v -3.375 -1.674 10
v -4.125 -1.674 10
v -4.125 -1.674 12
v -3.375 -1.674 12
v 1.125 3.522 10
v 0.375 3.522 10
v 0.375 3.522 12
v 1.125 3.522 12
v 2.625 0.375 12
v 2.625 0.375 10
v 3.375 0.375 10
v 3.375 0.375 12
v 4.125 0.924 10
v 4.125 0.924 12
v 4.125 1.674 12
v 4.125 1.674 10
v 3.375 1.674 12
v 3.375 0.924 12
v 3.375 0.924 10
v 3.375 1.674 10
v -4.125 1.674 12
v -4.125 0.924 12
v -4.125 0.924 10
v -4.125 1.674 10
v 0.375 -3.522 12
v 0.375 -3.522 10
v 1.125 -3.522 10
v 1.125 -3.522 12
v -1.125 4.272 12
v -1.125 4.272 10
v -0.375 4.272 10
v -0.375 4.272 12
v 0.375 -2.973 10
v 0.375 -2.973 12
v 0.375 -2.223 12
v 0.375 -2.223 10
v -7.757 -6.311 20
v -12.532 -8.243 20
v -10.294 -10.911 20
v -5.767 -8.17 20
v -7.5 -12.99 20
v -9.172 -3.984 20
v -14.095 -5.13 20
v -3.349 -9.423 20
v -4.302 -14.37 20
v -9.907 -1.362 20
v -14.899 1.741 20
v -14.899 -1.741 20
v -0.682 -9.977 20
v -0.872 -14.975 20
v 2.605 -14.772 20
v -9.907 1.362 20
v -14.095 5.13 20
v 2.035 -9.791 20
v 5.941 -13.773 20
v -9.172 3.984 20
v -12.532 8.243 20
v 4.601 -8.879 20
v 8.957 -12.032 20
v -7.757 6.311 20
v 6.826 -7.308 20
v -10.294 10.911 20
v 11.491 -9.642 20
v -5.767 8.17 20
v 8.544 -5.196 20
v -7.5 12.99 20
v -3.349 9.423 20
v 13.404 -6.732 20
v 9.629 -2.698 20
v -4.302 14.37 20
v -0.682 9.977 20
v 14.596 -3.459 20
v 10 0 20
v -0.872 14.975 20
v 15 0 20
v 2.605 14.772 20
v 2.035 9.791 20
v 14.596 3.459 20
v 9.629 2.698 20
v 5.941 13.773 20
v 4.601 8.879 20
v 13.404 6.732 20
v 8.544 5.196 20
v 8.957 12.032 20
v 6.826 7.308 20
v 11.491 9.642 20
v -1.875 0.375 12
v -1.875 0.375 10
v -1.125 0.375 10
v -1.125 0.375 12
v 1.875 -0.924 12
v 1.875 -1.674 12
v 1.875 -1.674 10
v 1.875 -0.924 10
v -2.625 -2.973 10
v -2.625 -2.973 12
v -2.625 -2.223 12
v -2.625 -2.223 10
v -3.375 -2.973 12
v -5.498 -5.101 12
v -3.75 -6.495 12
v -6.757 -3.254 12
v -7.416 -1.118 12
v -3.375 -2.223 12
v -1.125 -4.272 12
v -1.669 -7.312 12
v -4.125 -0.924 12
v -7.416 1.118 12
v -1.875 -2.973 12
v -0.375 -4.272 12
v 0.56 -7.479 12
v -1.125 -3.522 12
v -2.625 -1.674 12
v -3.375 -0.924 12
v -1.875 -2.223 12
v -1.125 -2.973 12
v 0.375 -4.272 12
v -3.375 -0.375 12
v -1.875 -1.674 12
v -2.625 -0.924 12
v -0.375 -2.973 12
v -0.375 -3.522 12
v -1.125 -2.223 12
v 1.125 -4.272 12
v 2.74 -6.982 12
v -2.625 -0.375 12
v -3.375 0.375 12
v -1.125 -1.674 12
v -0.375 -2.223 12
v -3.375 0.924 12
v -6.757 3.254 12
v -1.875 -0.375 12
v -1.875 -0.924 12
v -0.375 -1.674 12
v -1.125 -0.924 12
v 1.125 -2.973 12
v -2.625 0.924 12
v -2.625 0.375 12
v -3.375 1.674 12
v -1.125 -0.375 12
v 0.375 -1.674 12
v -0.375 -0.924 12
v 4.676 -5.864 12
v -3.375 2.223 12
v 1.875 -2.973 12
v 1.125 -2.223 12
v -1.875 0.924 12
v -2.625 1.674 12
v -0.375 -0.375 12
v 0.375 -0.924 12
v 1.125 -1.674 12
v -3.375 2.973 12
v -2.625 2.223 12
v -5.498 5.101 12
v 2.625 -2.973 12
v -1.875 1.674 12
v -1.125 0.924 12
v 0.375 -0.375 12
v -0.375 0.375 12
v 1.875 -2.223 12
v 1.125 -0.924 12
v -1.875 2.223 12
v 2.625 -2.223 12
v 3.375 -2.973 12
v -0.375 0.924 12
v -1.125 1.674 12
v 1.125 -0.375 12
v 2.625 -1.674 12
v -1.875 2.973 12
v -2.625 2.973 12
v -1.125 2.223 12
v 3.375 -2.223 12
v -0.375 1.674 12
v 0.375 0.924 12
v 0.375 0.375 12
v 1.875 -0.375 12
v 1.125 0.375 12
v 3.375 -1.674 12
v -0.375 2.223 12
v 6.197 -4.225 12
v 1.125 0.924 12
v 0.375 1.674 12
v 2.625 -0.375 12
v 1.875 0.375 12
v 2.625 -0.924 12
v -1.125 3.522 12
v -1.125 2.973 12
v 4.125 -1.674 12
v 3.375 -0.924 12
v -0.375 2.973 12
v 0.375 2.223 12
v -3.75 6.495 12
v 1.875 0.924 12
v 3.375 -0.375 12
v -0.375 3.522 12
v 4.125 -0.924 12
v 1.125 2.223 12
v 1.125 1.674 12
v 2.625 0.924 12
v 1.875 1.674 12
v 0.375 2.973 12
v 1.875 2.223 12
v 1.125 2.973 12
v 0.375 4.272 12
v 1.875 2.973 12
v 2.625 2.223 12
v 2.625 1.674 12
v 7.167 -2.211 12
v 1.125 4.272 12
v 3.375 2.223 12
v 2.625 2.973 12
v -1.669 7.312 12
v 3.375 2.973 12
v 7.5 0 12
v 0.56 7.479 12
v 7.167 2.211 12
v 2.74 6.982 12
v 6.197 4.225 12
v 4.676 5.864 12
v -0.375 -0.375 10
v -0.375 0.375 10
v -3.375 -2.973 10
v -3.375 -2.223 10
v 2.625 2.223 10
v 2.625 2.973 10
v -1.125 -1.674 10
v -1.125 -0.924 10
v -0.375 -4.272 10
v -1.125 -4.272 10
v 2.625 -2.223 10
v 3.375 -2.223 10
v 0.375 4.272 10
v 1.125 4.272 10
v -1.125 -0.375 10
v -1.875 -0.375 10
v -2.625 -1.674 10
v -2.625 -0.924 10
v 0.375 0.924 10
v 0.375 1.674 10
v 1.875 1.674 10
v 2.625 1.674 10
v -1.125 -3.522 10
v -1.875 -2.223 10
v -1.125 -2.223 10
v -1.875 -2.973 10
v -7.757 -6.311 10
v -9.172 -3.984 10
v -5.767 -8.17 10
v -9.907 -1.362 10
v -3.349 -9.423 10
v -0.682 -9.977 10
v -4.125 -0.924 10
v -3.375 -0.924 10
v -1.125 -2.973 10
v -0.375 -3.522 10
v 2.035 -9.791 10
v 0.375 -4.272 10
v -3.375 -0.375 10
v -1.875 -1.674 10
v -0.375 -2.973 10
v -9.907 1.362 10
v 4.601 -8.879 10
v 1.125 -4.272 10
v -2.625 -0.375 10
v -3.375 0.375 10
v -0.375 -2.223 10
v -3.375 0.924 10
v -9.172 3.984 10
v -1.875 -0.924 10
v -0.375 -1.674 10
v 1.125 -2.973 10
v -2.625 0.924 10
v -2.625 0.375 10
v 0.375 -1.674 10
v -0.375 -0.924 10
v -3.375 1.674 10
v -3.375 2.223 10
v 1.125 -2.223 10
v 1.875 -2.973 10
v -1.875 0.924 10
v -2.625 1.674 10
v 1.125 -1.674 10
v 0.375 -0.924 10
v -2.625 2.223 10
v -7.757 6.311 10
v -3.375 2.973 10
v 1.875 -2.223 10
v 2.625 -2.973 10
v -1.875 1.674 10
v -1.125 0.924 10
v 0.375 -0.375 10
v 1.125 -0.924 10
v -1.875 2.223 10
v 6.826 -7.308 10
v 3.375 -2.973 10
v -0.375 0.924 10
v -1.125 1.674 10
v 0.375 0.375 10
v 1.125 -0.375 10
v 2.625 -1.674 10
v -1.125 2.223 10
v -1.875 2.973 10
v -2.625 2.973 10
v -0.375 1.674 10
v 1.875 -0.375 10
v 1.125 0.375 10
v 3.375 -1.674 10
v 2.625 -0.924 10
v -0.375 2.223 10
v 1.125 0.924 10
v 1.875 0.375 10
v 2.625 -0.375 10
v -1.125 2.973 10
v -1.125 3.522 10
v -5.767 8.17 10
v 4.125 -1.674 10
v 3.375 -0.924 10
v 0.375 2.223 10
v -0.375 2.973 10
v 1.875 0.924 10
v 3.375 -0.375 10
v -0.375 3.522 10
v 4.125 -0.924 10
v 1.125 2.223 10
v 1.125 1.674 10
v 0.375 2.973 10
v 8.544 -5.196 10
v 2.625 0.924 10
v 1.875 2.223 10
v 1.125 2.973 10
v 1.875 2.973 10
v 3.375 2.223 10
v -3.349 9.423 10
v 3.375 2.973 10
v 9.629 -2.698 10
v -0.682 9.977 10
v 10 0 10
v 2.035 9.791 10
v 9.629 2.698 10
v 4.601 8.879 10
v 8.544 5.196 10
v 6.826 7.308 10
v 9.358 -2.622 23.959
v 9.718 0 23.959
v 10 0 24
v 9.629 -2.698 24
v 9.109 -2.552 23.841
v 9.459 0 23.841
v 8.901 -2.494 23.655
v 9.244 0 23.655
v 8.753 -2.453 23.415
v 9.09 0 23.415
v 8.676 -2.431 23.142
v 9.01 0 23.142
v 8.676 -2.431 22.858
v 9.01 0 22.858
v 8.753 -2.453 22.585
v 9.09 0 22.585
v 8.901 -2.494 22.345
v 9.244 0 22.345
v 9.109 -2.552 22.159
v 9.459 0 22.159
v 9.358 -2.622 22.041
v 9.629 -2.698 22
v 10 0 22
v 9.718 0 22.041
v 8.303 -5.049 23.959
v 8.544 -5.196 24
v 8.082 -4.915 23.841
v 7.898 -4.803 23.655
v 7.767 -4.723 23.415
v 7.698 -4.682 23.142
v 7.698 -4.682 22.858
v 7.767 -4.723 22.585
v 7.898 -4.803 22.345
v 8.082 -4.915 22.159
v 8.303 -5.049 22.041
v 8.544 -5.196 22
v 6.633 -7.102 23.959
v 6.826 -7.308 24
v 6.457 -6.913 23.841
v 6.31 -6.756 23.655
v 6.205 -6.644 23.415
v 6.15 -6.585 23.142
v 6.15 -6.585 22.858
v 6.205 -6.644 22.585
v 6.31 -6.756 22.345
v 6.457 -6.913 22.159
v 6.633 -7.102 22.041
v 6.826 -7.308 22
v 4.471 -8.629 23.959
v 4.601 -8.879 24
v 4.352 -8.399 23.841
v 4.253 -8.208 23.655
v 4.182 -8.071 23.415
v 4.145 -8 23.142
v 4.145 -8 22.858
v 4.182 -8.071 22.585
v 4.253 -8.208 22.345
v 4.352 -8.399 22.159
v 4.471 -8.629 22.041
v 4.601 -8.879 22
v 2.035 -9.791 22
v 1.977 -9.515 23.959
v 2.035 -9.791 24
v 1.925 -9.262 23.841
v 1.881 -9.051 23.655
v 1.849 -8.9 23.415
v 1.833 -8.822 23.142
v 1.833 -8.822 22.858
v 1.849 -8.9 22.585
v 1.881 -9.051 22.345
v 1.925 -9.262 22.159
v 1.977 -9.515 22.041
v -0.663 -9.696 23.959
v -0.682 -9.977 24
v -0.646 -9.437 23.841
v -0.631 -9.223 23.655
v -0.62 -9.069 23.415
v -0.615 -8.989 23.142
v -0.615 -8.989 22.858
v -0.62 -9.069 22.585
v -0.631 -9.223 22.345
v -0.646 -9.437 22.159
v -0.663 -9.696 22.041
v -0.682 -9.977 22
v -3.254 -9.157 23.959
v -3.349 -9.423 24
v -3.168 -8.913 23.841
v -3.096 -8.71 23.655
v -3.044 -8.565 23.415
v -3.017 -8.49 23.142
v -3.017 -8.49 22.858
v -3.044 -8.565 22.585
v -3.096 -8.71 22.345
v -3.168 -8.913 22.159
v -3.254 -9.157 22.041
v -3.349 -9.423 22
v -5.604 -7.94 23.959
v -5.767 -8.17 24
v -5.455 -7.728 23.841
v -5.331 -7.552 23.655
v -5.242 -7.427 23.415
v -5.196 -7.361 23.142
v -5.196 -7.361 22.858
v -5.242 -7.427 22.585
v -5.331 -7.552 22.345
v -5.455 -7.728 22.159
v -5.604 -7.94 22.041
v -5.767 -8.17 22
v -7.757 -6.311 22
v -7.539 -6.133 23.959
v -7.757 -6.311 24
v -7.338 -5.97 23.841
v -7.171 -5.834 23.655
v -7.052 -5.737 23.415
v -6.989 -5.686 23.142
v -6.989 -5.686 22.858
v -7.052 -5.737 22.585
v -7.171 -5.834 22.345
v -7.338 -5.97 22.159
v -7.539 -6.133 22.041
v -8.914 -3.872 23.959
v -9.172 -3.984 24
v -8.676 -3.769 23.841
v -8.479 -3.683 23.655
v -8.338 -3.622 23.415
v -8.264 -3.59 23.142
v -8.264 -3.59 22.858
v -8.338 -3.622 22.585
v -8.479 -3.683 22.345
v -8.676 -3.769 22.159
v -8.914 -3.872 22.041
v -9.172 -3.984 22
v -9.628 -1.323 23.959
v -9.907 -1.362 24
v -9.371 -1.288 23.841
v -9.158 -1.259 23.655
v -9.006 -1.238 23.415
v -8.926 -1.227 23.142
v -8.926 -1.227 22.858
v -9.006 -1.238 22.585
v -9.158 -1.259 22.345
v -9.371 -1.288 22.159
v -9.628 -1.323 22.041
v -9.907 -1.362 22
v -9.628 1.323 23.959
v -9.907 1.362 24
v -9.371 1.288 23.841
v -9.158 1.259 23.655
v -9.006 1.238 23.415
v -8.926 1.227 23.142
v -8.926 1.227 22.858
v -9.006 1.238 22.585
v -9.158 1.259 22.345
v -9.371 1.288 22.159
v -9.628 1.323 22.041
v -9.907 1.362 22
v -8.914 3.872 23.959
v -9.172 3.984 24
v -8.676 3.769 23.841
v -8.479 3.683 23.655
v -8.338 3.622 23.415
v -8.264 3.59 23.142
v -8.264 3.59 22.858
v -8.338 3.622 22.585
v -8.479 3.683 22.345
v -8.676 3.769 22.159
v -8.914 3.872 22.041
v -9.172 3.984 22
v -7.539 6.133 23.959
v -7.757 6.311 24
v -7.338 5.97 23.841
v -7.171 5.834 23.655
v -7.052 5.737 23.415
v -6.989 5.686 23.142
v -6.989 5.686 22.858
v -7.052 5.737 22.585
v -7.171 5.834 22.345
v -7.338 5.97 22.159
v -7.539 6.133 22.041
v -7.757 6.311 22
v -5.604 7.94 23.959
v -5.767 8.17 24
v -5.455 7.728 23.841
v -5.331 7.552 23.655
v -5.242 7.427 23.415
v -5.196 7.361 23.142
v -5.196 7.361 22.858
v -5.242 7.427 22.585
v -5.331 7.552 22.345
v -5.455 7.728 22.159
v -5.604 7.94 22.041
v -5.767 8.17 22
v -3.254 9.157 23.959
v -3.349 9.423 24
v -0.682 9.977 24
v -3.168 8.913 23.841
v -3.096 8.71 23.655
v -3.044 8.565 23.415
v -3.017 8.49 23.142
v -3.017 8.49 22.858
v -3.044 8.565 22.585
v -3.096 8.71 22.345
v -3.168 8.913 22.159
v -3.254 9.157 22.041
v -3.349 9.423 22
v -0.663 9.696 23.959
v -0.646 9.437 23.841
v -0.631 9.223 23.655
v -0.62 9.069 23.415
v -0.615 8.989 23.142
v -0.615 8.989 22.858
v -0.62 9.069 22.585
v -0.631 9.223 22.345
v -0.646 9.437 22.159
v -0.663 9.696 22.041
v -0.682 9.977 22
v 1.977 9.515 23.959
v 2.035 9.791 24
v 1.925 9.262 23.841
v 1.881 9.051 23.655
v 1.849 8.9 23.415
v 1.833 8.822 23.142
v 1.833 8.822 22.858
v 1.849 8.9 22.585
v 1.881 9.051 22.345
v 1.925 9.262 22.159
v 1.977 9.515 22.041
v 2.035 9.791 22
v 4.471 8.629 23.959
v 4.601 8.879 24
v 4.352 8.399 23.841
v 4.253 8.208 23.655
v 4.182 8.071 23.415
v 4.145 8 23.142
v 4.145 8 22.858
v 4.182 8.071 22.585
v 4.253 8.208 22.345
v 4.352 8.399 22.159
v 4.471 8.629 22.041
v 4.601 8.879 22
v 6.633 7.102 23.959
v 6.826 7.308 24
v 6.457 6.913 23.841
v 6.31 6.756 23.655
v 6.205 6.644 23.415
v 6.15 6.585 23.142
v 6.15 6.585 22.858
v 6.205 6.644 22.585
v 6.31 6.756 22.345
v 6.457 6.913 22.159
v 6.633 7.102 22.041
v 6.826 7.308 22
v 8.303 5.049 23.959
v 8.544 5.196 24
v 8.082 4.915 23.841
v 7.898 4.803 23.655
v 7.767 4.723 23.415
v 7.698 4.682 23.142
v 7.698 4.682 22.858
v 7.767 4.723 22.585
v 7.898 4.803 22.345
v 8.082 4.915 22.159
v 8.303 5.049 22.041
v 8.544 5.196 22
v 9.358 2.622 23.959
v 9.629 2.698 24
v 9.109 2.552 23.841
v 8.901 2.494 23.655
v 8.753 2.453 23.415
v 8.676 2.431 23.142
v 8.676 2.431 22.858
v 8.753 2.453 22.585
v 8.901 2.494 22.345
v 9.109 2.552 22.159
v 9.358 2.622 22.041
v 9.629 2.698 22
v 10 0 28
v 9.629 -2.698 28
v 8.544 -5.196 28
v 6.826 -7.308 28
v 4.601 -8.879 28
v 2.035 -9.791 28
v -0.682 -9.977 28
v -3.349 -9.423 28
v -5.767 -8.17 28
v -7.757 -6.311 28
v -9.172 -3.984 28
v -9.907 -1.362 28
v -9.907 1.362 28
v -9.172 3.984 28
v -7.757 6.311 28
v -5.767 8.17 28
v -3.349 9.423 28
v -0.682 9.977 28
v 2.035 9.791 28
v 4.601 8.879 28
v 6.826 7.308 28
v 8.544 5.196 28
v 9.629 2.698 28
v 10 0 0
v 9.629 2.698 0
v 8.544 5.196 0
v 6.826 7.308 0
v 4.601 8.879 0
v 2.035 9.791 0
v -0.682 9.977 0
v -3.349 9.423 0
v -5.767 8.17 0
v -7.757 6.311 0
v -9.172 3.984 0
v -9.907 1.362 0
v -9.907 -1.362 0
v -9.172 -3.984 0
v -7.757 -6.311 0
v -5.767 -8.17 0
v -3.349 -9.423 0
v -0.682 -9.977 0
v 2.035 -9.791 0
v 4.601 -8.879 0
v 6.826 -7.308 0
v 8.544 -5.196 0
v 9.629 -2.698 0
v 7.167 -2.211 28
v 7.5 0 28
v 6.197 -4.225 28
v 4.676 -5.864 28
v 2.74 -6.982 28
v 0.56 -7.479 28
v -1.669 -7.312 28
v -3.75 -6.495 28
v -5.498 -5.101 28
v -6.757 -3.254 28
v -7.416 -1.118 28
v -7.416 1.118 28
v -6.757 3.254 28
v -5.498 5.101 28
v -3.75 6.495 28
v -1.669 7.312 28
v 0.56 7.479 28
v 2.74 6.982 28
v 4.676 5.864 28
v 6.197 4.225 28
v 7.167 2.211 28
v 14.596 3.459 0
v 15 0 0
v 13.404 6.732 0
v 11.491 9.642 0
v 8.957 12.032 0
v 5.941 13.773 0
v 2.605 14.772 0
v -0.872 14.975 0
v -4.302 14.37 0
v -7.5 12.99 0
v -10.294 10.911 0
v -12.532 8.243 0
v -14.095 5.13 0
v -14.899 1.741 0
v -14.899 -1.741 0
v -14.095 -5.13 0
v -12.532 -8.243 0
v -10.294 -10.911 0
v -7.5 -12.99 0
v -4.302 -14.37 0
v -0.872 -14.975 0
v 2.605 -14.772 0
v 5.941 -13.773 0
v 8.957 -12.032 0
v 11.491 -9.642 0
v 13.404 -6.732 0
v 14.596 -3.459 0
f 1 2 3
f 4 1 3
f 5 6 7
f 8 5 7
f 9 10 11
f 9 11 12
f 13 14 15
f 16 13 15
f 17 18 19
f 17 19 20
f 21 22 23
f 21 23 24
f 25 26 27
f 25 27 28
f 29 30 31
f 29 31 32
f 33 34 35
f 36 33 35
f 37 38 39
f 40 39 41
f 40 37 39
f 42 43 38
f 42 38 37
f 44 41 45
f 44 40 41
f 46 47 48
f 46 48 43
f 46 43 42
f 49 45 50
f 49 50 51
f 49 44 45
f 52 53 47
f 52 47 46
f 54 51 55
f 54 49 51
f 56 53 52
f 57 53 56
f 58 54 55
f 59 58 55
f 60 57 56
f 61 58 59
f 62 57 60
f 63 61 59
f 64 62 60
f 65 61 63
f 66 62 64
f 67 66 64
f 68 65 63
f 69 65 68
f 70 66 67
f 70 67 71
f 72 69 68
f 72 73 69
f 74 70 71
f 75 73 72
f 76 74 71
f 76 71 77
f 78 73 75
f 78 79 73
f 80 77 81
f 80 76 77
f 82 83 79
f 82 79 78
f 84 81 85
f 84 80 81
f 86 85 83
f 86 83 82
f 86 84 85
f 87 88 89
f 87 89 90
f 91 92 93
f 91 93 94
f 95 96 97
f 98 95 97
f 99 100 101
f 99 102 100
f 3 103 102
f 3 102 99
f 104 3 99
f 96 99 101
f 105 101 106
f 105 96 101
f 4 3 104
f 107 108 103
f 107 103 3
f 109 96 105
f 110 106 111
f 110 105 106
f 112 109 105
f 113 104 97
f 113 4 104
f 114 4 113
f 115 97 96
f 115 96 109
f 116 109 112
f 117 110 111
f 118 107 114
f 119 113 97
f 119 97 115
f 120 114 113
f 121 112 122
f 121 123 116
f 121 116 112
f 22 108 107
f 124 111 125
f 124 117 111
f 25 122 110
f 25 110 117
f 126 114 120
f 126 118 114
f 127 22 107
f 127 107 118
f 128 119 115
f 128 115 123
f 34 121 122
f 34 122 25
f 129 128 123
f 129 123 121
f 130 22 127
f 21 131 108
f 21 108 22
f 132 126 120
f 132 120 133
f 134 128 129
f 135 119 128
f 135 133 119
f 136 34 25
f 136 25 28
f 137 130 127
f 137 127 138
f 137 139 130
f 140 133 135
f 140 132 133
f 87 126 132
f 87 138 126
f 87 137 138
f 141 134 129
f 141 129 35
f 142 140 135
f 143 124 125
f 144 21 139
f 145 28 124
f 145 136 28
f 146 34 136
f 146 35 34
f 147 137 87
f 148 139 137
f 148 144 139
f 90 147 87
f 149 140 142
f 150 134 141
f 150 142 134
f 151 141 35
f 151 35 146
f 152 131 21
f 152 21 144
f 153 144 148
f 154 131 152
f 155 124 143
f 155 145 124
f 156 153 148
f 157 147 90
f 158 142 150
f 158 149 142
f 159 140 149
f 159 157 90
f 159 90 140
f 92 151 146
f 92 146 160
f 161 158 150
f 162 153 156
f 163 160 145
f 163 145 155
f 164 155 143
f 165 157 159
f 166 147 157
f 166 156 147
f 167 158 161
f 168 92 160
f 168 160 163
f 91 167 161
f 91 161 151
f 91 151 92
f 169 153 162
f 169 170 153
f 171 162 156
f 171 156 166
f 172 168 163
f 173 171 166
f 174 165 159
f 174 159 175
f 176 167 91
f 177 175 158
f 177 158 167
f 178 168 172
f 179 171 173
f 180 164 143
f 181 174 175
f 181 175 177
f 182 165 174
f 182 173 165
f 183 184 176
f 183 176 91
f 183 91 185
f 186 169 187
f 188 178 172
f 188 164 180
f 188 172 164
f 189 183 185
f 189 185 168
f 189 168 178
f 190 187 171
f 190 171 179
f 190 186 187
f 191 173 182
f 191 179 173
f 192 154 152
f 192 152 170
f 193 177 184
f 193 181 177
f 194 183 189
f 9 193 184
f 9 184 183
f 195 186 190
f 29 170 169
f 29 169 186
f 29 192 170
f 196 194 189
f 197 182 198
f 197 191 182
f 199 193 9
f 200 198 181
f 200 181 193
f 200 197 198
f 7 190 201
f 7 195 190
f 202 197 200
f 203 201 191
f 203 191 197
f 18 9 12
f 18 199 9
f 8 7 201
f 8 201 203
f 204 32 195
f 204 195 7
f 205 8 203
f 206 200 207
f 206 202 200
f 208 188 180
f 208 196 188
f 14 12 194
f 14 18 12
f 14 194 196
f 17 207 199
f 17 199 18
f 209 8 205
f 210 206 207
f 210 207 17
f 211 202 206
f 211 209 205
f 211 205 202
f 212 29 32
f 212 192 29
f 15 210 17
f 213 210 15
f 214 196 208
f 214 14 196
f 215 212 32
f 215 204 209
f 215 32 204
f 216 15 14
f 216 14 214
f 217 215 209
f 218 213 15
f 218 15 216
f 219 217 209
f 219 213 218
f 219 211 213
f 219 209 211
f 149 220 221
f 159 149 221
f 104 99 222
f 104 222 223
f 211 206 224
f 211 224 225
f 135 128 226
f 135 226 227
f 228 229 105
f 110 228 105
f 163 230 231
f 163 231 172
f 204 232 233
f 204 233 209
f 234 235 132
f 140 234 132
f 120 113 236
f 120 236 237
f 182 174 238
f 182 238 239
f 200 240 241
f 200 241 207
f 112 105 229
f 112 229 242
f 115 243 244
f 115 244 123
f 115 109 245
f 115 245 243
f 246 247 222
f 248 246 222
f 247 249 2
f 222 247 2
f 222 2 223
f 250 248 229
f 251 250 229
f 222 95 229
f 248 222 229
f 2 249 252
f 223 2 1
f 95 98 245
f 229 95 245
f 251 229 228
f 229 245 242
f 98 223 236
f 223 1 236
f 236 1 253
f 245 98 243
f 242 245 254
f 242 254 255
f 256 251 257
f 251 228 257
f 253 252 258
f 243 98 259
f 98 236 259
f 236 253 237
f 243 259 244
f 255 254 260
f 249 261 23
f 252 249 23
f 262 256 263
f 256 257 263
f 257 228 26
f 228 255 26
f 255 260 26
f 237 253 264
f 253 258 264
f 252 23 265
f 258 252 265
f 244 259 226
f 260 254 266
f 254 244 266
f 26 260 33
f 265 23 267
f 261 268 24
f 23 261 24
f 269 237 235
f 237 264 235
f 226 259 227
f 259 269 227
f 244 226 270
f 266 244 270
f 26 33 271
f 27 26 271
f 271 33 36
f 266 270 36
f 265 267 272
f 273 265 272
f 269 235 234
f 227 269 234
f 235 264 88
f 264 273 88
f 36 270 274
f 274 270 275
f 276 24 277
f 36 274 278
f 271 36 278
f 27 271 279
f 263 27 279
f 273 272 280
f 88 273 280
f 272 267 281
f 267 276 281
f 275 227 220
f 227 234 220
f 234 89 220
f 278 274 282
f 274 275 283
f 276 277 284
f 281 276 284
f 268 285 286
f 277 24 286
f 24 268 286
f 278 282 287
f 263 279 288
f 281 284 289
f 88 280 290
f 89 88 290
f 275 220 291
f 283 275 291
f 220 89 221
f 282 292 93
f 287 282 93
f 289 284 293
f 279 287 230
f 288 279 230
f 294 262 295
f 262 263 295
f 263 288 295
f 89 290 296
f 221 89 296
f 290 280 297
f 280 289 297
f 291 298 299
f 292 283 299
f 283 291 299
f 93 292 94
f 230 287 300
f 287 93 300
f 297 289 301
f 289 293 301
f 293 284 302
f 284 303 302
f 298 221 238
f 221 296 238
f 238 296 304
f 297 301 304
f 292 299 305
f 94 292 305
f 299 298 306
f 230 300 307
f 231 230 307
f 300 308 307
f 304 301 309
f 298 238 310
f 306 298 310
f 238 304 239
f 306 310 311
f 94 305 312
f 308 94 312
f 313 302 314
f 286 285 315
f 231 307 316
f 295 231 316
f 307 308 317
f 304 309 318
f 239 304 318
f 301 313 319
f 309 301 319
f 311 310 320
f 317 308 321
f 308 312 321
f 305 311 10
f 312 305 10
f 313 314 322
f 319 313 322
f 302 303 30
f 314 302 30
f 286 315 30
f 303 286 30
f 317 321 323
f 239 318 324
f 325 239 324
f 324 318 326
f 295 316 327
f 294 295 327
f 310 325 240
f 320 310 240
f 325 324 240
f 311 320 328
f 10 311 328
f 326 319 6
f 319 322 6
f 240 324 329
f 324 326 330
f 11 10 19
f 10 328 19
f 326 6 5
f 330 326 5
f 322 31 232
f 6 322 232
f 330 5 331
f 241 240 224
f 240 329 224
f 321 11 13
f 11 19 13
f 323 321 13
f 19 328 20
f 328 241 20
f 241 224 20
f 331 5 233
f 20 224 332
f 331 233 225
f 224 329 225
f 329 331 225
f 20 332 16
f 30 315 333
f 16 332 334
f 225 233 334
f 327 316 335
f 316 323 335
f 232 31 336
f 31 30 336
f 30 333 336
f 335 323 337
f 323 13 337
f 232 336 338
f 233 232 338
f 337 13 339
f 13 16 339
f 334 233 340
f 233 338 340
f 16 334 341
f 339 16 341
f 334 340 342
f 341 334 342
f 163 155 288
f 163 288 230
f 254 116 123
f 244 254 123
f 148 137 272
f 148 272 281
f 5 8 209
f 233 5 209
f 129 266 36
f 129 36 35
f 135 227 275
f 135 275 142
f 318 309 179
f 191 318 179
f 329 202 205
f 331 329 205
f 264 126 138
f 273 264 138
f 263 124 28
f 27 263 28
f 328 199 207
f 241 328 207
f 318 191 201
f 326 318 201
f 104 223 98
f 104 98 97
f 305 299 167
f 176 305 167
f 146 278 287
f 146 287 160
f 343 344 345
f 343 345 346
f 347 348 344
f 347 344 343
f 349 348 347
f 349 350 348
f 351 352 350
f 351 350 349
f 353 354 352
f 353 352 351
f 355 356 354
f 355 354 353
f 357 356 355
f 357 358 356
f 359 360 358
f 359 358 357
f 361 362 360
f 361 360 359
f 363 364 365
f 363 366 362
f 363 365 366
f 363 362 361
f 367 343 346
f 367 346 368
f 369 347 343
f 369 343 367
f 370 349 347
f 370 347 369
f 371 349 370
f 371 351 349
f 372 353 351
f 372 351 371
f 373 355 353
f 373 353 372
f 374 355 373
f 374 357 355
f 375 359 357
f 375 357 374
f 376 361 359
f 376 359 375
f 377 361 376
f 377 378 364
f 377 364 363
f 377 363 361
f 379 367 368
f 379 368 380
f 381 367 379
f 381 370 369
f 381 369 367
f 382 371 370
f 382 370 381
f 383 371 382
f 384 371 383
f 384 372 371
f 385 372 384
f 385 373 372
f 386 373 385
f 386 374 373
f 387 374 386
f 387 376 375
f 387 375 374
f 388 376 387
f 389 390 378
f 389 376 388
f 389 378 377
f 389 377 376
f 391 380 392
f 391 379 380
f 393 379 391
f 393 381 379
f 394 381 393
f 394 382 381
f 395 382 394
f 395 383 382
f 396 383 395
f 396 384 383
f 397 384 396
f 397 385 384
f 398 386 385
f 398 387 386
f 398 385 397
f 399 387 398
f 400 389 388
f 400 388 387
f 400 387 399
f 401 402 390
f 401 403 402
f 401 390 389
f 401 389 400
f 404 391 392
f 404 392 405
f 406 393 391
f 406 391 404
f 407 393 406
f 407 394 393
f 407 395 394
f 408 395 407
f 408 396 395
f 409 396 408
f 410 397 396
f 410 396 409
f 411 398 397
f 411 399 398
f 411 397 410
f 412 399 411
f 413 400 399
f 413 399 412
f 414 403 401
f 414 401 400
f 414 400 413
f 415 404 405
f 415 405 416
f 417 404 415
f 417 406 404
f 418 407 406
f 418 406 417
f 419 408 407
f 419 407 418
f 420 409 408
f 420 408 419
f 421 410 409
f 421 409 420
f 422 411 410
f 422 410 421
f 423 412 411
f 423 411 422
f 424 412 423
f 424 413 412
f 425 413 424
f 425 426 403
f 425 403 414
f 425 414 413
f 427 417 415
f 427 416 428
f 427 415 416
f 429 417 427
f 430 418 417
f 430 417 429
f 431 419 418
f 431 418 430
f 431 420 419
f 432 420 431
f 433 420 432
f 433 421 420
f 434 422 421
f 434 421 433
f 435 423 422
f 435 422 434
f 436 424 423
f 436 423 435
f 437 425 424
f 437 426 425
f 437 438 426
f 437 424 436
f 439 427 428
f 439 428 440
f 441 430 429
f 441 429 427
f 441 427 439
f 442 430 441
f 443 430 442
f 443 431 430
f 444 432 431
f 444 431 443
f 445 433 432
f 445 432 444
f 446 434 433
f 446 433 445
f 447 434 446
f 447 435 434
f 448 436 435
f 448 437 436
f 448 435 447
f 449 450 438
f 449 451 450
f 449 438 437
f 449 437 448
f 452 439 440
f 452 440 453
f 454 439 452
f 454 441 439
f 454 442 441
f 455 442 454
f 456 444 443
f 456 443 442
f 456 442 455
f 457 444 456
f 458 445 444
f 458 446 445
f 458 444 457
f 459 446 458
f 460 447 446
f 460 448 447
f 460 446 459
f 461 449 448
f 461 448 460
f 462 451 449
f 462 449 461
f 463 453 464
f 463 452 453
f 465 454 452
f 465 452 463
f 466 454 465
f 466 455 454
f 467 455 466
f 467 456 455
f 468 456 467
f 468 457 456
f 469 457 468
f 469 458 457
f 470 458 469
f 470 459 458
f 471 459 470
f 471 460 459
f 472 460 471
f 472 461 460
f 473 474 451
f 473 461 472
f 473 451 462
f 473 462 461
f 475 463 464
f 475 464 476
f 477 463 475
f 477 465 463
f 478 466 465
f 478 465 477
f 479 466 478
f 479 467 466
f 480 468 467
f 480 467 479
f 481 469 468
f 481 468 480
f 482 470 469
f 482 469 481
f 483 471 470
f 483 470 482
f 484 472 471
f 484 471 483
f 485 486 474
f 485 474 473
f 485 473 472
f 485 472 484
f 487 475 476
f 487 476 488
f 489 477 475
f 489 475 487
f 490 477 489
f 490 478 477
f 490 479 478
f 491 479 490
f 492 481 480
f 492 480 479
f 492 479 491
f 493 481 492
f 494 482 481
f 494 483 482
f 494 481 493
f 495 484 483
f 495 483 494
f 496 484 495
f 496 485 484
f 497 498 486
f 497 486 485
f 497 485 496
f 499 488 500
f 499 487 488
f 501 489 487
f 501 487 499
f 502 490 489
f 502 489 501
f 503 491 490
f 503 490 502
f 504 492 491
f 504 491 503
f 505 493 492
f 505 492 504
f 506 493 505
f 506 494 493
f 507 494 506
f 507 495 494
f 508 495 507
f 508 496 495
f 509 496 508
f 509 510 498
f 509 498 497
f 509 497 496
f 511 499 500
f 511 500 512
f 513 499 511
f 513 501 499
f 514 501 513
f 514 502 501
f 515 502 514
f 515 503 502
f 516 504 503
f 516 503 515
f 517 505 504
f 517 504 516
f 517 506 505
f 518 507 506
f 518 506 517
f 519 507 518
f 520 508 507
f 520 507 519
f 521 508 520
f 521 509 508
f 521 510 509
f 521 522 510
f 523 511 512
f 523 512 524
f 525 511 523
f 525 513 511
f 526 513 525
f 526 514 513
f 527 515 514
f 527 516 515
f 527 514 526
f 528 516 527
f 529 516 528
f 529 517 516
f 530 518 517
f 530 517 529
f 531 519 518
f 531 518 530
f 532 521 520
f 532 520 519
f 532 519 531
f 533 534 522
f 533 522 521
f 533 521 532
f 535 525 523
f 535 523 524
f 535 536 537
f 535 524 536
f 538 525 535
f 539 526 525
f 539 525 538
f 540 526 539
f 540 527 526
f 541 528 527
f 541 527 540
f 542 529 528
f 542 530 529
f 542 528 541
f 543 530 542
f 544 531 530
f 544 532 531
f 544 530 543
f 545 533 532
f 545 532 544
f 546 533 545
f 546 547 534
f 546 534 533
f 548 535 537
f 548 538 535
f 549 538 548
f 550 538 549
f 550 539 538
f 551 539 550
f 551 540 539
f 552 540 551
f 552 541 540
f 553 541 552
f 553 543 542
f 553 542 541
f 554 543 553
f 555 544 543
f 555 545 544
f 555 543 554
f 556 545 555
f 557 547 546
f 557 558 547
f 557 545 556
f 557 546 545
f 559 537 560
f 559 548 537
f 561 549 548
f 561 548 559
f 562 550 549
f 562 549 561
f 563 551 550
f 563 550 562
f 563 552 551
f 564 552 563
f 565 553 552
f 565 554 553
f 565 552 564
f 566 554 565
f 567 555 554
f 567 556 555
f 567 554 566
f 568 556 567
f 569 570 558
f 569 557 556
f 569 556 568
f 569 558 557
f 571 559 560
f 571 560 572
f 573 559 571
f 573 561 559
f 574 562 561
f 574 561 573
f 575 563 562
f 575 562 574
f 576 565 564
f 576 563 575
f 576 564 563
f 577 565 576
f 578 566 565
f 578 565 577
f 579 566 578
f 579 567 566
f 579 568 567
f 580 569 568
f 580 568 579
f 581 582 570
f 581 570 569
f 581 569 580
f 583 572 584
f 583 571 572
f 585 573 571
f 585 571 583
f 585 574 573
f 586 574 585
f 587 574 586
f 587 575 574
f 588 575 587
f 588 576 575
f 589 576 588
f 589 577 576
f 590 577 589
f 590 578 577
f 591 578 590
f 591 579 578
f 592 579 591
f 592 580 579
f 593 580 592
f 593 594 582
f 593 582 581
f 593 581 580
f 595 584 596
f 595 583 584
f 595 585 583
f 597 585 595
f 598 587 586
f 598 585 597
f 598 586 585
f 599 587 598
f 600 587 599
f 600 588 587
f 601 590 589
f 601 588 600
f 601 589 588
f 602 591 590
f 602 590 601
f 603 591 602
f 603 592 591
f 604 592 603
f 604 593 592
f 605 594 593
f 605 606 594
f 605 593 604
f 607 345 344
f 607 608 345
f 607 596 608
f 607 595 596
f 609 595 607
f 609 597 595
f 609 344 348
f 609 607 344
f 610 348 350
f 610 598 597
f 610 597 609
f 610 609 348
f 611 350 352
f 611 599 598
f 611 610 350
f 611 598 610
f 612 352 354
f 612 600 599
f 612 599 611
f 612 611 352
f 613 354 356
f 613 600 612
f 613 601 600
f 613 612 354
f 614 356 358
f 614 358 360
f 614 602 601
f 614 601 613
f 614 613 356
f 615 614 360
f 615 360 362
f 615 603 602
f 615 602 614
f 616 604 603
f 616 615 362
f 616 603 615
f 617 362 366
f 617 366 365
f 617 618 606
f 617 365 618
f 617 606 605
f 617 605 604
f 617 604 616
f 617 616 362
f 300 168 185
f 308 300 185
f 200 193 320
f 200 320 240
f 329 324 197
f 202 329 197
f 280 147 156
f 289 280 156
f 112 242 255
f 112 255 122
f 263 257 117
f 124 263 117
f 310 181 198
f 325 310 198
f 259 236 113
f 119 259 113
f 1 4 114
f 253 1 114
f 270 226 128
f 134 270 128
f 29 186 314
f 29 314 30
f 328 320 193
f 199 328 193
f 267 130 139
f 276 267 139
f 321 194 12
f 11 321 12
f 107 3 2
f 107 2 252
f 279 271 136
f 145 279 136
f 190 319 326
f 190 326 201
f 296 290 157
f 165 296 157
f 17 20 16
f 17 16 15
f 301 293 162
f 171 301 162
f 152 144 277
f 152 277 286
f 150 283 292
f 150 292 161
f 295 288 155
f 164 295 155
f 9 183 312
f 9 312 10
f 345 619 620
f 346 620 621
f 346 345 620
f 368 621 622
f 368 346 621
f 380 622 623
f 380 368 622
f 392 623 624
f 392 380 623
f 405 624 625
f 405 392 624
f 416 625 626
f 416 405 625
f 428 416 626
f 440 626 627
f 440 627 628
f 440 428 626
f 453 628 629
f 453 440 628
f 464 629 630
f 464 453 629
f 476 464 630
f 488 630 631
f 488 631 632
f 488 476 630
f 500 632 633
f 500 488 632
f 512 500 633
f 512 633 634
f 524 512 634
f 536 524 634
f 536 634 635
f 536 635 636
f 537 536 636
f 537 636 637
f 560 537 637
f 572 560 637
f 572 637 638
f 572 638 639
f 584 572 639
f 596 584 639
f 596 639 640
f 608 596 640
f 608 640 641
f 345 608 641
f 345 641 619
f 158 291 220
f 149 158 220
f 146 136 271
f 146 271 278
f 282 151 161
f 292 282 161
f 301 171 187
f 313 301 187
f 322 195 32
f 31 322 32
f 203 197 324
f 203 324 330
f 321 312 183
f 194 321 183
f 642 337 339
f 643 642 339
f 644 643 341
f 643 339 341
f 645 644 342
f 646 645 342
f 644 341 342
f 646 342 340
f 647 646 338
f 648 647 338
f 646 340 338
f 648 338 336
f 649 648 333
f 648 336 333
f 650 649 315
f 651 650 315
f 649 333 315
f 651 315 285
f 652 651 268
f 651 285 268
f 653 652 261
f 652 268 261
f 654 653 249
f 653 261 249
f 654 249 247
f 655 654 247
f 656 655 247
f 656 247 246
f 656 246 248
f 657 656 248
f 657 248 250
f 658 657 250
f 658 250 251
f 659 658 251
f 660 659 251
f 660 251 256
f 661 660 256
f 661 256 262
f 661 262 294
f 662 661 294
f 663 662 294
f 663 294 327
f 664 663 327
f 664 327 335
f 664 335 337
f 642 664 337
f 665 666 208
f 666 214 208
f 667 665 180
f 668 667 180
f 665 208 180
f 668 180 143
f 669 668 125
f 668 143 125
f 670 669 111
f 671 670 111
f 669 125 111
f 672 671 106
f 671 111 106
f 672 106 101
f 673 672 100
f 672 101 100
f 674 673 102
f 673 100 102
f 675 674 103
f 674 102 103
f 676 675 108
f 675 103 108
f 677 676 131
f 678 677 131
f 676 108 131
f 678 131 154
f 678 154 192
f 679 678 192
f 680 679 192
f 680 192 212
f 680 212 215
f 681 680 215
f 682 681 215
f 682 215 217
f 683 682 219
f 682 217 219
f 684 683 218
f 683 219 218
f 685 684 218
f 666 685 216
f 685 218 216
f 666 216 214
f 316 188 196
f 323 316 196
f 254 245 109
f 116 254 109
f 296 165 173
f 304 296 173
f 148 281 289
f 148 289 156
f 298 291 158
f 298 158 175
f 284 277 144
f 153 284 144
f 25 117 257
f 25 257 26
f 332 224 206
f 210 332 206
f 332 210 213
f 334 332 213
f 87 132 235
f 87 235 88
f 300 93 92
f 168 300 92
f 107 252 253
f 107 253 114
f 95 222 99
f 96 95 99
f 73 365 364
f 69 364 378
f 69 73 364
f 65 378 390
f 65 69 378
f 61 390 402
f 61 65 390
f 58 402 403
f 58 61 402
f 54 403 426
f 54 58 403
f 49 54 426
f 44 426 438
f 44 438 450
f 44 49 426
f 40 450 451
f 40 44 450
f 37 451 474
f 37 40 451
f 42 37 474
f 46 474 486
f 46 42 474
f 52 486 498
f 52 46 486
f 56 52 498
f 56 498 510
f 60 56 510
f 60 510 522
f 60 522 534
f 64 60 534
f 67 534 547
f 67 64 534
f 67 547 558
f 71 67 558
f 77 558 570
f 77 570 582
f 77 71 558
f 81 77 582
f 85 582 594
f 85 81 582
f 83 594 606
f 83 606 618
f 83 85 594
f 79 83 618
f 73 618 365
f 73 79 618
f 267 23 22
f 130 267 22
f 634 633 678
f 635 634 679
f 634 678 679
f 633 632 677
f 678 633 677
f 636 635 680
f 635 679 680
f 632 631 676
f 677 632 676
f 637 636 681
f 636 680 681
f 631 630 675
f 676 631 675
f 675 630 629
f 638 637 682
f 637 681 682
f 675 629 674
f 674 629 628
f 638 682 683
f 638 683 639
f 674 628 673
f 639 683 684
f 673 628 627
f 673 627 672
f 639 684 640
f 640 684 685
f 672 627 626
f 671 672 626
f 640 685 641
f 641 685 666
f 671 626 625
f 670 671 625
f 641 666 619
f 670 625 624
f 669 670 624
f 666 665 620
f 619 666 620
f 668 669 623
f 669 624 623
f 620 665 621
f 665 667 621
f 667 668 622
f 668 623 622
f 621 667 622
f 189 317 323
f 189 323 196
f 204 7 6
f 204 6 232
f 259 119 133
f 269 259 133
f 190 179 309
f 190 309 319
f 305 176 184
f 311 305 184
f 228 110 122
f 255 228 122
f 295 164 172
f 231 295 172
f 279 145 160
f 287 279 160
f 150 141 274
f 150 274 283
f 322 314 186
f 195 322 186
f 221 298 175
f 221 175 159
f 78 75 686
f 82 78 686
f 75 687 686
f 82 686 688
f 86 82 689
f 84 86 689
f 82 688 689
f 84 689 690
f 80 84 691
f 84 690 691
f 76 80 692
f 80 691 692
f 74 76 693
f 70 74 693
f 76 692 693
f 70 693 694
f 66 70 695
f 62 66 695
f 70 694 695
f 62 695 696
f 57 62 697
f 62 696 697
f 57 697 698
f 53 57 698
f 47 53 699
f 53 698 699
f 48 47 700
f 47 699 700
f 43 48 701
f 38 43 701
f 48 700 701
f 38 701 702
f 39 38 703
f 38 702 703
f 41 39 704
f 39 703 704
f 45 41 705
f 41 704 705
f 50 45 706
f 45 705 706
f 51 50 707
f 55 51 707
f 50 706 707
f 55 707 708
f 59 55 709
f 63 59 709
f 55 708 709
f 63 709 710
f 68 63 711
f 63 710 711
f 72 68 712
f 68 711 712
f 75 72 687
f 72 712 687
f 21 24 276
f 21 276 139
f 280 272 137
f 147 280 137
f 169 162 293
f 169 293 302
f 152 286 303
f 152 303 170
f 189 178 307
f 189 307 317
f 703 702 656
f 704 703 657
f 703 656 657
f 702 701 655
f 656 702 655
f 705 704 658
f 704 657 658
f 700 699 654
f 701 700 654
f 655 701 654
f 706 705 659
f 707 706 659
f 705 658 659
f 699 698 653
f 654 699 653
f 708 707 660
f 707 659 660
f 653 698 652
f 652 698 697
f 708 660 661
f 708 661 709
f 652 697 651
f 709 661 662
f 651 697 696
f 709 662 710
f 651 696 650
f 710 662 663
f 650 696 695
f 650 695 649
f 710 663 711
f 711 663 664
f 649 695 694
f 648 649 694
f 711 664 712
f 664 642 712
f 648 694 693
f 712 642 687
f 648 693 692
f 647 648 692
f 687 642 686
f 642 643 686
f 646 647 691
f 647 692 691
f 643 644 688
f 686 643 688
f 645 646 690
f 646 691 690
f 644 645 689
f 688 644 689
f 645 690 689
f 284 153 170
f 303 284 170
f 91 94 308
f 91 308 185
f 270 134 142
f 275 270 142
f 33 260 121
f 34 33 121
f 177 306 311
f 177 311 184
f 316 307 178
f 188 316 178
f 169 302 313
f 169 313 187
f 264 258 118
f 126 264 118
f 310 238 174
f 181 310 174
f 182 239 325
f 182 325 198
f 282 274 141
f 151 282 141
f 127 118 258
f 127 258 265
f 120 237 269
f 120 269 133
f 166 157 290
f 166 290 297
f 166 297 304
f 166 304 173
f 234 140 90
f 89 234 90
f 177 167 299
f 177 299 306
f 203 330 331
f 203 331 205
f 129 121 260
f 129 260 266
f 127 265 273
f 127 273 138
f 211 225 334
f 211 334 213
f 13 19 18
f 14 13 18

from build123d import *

# Parameters (mm, degrees)
SKETCH1_R                  = 15
BOSS_EXTRUDE1_DEPTH        = 10
SKETCH2_R                  = 10
CUT_EXTRUDE1_DEPTH         = 20
SKETCH3_R                  = 15
BOSS_EXTRUDE2_DEPTH        = 10
SKETCH5_R                  = 10
CUT_EXTRUDE3_DEPTH         = 8
SKETCH8_W                  = 0.75
SKETCH8_H                  = 0.75
CUT_EXTRUDE5_DEPTH         = 2
FILL_START                 = -1.125
FILL_PATTERN2_OUTLINE_W    = 0.75
FILL_PATTERN2_OUTLINE_H    = 2
FILL_PATTERN2_DEPTH        = 0.75
FILL_START_2               = 0.375
FILL_PATTERN2_2_OUTLINE_W  = 0.75
FILL_PATTERN2_2_OUTLINE_H  = 2
FILL_PATTERN2_2_DEPTH      = 0.75
FILL_START_3               = -3.375
FILL_PATTERN2_3_OUTLINE_W  = 0.75
FILL_PATTERN2_3_OUTLINE_H  = 2
FILL_PATTERN2_3_DEPTH      = 0.75
FILL_START_4               = -1.875
FILL_PATTERN2_4_OUTLINE_W  = 0.75
FILL_PATTERN2_4_OUTLINE_H  = 2
FILL_PATTERN2_4_DEPTH      = 0.75
FILL_START_5               = 1.125
FILL_PATTERN2_5_OUTLINE_W  = 0.75
FILL_PATTERN2_5_OUTLINE_H  = 2
FILL_PATTERN2_5_DEPTH      = 0.75
FILL_START_6               = 2.625
FILL_PATTERN2_6_OUTLINE_W  = 0.75
FILL_PATTERN2_6_OUTLINE_H  = 2
FILL_PATTERN2_6_DEPTH      = 0.75
FILL_START_7               = -4.125
FILL_PATTERN2_7_OUTLINE_W  = 0.75
FILL_PATTERN2_7_OUTLINE_H  = 2
FILL_PATTERN2_7_DEPTH      = 0.75
FILL_START_8               = -2.625
FILL_PATTERN2_8_OUTLINE_W  = 0.75
FILL_PATTERN2_8_OUTLINE_H  = 2
FILL_PATTERN2_8_DEPTH      = 0.75
FILL_START_9               = -0.375
FILL_PATTERN2_9_OUTLINE_W  = 0.75
FILL_PATTERN2_9_OUTLINE_H  = 2
FILL_PATTERN2_9_DEPTH      = 0.75
FILL_START_10              = 1.875
FILL_PATTERN2_10_OUTLINE_W = 0.75
FILL_PATTERN2_10_OUTLINE_H = 2
FILL_PATTERN2_10_DEPTH     = 0.75
FILL_START_11              = 3.375
FILL_PATTERN2_11_OUTLINE_W = 0.75
FILL_PATTERN2_11_OUTLINE_H = 2
FILL_PATTERN2_11_DEPTH     = 0.75
SKETCH15_W                 = 16
SKETCH15_H                 = 2.5
SKETCH16_R                 = 1


# Read off the part's stored shape, not the designer's step: Fill Pattern2
with BuildPart() as part:
    # Sketch1 → Boss-Extrude1 (new body)
    with BuildSketch(Plane.XY):
        Circle(SKETCH1_R)
    extrude(amount=BOSS_EXTRUDE1_DEPTH)

    # Sketch2 → Cut-Extrude1 (cut)
    with BuildSketch(Plane.XY.offset(10)):
        Circle(SKETCH2_R)
    extrude(amount=-CUT_EXTRUDE1_DEPTH, mode=Mode.SUBTRACT)

    # Sketch3 → Boss-Extrude2 (add)
    with BuildSketch(Plane.XY.offset(10)):
        Circle(SKETCH3_R)
    extrude(amount=BOSS_EXTRUDE2_DEPTH)

    # Sketch5 → Cut-Extrude3 (cut)
    with BuildSketch(Plane.XY.offset(20)):
        Circle(SKETCH5_R)
    extrude(amount=-CUT_EXTRUDE3_DEPTH, mode=Mode.SUBTRACT)

    # Sketch8 → Cut-Extrude5 (cut)
    with BuildSketch(Plane(origin=(0, 0, 10), x_dir=(-1, 0, 0), z_dir=(0, 0, -1))):
        Rectangle(SKETCH8_W, SKETCH8_H)
    extrude(amount=-CUT_EXTRUDE5_DEPTH, mode=Mode.SUBTRACT)

    # Fill Pattern2 outline → Fill Pattern2 (cut)
    with BuildSketch(Plane.YZ.offset(FILL_START)):
        with Locations((-1.299038106, 11)):
            Rectangle(FILL_PATTERN2_OUTLINE_W, FILL_PATTERN2_OUTLINE_H)
        with Locations((1.299038106, 11)):
            Rectangle(FILL_PATTERN2_OUTLINE_W, FILL_PATTERN2_OUTLINE_H)
        with Locations((-3.897114317, 11)):
            Rectangle(FILL_PATTERN2_OUTLINE_W, FILL_PATTERN2_OUTLINE_H)
        with Locations((3.897114317, 11)):
            Rectangle(FILL_PATTERN2_OUTLINE_W, FILL_PATTERN2_OUTLINE_H)
    extrude(amount=FILL_PATTERN2_DEPTH, mode=Mode.SUBTRACT)

    # Fill Pattern2 2 outline → Fill Pattern2 2 (cut)
    with BuildSketch(Plane.YZ.offset(FILL_START_2)):
        with Locations((-1.299038106, 11)):
            Rectangle(FILL_PATTERN2_2_OUTLINE_W, FILL_PATTERN2_2_OUTLINE_H)
        with Locations((1.299038106, 11)):
            Rectangle(FILL_PATTERN2_2_OUTLINE_W, FILL_PATTERN2_2_OUTLINE_H)
        with Locations((-3.897114317, 11)):
            Rectangle(FILL_PATTERN2_2_OUTLINE_W, FILL_PATTERN2_2_OUTLINE_H)
        with Locations((3.897114317, 11)):
            Rectangle(FILL_PATTERN2_2_OUTLINE_W, FILL_PATTERN2_2_OUTLINE_H)
    extrude(amount=FILL_PATTERN2_2_DEPTH, mode=Mode.SUBTRACT)

    # Fill Pattern2 3 outline → Fill Pattern2 3 (cut)
    with BuildSketch(Plane.YZ.offset(FILL_START_3)):
        with Locations((0, 11)):
            Rectangle(FILL_PATTERN2_3_OUTLINE_W, FILL_PATTERN2_3_OUTLINE_H)
        with Locations((-2.598076211, 11)):
            Rectangle(FILL_PATTERN2_3_OUTLINE_W, FILL_PATTERN2_3_OUTLINE_H)
        with Locations((2.598076211, 11)):
            Rectangle(FILL_PATTERN2_3_OUTLINE_W, FILL_PATTERN2_3_OUTLINE_H)
    extrude(amount=FILL_PATTERN2_3_DEPTH, mode=Mode.SUBTRACT)

    # Fill Pattern2 4 outline → Fill Pattern2 4 (cut)
    with BuildSketch(Plane.YZ.offset(FILL_START_4)):
        with Locations((0, 11)):
            Rectangle(FILL_PATTERN2_4_OUTLINE_W, FILL_PATTERN2_4_OUTLINE_H)
        with Locations((-2.598076211, 11)):
            Rectangle(FILL_PATTERN2_4_OUTLINE_W, FILL_PATTERN2_4_OUTLINE_H)
        with Locations((2.598076211, 11)):
            Rectangle(FILL_PATTERN2_4_OUTLINE_W, FILL_PATTERN2_4_OUTLINE_H)
    extrude(amount=FILL_PATTERN2_4_DEPTH, mode=Mode.SUBTRACT)

    # Fill Pattern2 5 outline → Fill Pattern2 5 (cut)
    with BuildSketch(Plane.YZ.offset(FILL_START_5)):
        with Locations((0, 11)):
            Rectangle(FILL_PATTERN2_5_OUTLINE_W, FILL_PATTERN2_5_OUTLINE_H)
        with Locations((-2.598076211, 11)):
            Rectangle(FILL_PATTERN2_5_OUTLINE_W, FILL_PATTERN2_5_OUTLINE_H)
        with Locations((2.598076211, 11)):
            Rectangle(FILL_PATTERN2_5_OUTLINE_W, FILL_PATTERN2_5_OUTLINE_H)
    extrude(amount=FILL_PATTERN2_5_DEPTH, mode=Mode.SUBTRACT)

    # Fill Pattern2 6 outline → Fill Pattern2 6 (cut)
    with BuildSketch(Plane.YZ.offset(FILL_START_6)):
        with Locations((0, 11)):
            Rectangle(FILL_PATTERN2_6_OUTLINE_W, FILL_PATTERN2_6_OUTLINE_H)
        with Locations((-2.598076211, 11)):
            Rectangle(FILL_PATTERN2_6_OUTLINE_W, FILL_PATTERN2_6_OUTLINE_H)
        with Locations((2.598076211, 11)):
            Rectangle(FILL_PATTERN2_6_OUTLINE_W, FILL_PATTERN2_6_OUTLINE_H)
    extrude(amount=FILL_PATTERN2_6_DEPTH, mode=Mode.SUBTRACT)

    # Fill Pattern2 7 outline → Fill Pattern2 7 (cut)
    with BuildSketch(Plane.YZ.offset(FILL_START_7)):
        with Locations((-1.299038106, 11)):
            Rectangle(FILL_PATTERN2_7_OUTLINE_W, FILL_PATTERN2_7_OUTLINE_H)
        with Locations((1.299038106, 11)):
            Rectangle(FILL_PATTERN2_7_OUTLINE_W, FILL_PATTERN2_7_OUTLINE_H)
    extrude(amount=FILL_PATTERN2_7_DEPTH, mode=Mode.SUBTRACT)

    # Fill Pattern2 8 outline → Fill Pattern2 8 (cut)
    with BuildSketch(Plane.YZ.offset(FILL_START_8)):
        with Locations((-1.299038106, 11)):
            Rectangle(FILL_PATTERN2_8_OUTLINE_W, FILL_PATTERN2_8_OUTLINE_H)
        with Locations((1.299038106, 11)):
            Rectangle(FILL_PATTERN2_8_OUTLINE_W, FILL_PATTERN2_8_OUTLINE_H)
    extrude(amount=FILL_PATTERN2_8_DEPTH, mode=Mode.SUBTRACT)

    # Fill Pattern2 9 outline → Fill Pattern2 9 (cut)
    with BuildSketch(Plane.YZ.offset(FILL_START_9)):
        with Locations((-2.598076211, 11)):
            Rectangle(FILL_PATTERN2_9_OUTLINE_W, FILL_PATTERN2_9_OUTLINE_H)
        with Locations((2.598076211, 11)):
            Rectangle(FILL_PATTERN2_9_OUTLINE_W, FILL_PATTERN2_9_OUTLINE_H)
    extrude(amount=FILL_PATTERN2_9_DEPTH, mode=Mode.SUBTRACT)

    # Fill Pattern2 10 outline → Fill Pattern2 10 (cut)
    with BuildSketch(Plane.YZ.offset(FILL_START_10)):
        with Locations((-1.299038106, 11)):
            Rectangle(FILL_PATTERN2_10_OUTLINE_W, FILL_PATTERN2_10_OUTLINE_H)
        with Locations((1.299038106, 11)):
            Rectangle(FILL_PATTERN2_10_OUTLINE_W, FILL_PATTERN2_10_OUTLINE_H)
    extrude(amount=FILL_PATTERN2_10_DEPTH, mode=Mode.SUBTRACT)

    # Fill Pattern2 11 outline → Fill Pattern2 11 (cut)
    with BuildSketch(Plane.YZ.offset(FILL_START_11)):
        with Locations((-1.299038106, 11)):
            Rectangle(FILL_PATTERN2_11_OUTLINE_W, FILL_PATTERN2_11_OUTLINE_H)
        with Locations((1.299038106, 11)):
            Rectangle(FILL_PATTERN2_11_OUTLINE_W, FILL_PATTERN2_11_OUTLINE_H)
    extrude(amount=FILL_PATTERN2_11_DEPTH, mode=Mode.SUBTRACT)

    # Sketch15 → Revolve2 (revolve)
    with BuildSketch(Plane(origin=(0, 0, 0), x_dir=(0, 0, -1), z_dir=(1, 0, 0)), mode=Mode.PRIVATE) as revolve2_sk:
        with Locations((-20, -8.75)):
            Rectangle(SKETCH15_W, SKETCH15_H)
    revolve(revolve2_sk.sketch.rotate(Axis((0, 0, 20), (0, 0, -1)), 270), axis=Axis((0, 0, 20), (0, 0, -1)))

    # Sketch16 → Cut-Revolve2 (revolve, cut)
    with BuildSketch(Plane(origin=(0, 0, 0), x_dir=(0, 0, -1), z_dir=(1, 0, 0)), mode=Mode.PRIVATE) as cut_revolve2_sk:
        with Locations((-23, 10)):
            Circle(SKETCH16_R)
    revolve(cut_revolve2_sk.sketch.rotate(Axis((0, 0, 20), (0, 0, -1)), 90), axis=Axis((0, 0, 20), (0, 0, -1)), mode=Mode.SUBTRACT)


solid = part.part
